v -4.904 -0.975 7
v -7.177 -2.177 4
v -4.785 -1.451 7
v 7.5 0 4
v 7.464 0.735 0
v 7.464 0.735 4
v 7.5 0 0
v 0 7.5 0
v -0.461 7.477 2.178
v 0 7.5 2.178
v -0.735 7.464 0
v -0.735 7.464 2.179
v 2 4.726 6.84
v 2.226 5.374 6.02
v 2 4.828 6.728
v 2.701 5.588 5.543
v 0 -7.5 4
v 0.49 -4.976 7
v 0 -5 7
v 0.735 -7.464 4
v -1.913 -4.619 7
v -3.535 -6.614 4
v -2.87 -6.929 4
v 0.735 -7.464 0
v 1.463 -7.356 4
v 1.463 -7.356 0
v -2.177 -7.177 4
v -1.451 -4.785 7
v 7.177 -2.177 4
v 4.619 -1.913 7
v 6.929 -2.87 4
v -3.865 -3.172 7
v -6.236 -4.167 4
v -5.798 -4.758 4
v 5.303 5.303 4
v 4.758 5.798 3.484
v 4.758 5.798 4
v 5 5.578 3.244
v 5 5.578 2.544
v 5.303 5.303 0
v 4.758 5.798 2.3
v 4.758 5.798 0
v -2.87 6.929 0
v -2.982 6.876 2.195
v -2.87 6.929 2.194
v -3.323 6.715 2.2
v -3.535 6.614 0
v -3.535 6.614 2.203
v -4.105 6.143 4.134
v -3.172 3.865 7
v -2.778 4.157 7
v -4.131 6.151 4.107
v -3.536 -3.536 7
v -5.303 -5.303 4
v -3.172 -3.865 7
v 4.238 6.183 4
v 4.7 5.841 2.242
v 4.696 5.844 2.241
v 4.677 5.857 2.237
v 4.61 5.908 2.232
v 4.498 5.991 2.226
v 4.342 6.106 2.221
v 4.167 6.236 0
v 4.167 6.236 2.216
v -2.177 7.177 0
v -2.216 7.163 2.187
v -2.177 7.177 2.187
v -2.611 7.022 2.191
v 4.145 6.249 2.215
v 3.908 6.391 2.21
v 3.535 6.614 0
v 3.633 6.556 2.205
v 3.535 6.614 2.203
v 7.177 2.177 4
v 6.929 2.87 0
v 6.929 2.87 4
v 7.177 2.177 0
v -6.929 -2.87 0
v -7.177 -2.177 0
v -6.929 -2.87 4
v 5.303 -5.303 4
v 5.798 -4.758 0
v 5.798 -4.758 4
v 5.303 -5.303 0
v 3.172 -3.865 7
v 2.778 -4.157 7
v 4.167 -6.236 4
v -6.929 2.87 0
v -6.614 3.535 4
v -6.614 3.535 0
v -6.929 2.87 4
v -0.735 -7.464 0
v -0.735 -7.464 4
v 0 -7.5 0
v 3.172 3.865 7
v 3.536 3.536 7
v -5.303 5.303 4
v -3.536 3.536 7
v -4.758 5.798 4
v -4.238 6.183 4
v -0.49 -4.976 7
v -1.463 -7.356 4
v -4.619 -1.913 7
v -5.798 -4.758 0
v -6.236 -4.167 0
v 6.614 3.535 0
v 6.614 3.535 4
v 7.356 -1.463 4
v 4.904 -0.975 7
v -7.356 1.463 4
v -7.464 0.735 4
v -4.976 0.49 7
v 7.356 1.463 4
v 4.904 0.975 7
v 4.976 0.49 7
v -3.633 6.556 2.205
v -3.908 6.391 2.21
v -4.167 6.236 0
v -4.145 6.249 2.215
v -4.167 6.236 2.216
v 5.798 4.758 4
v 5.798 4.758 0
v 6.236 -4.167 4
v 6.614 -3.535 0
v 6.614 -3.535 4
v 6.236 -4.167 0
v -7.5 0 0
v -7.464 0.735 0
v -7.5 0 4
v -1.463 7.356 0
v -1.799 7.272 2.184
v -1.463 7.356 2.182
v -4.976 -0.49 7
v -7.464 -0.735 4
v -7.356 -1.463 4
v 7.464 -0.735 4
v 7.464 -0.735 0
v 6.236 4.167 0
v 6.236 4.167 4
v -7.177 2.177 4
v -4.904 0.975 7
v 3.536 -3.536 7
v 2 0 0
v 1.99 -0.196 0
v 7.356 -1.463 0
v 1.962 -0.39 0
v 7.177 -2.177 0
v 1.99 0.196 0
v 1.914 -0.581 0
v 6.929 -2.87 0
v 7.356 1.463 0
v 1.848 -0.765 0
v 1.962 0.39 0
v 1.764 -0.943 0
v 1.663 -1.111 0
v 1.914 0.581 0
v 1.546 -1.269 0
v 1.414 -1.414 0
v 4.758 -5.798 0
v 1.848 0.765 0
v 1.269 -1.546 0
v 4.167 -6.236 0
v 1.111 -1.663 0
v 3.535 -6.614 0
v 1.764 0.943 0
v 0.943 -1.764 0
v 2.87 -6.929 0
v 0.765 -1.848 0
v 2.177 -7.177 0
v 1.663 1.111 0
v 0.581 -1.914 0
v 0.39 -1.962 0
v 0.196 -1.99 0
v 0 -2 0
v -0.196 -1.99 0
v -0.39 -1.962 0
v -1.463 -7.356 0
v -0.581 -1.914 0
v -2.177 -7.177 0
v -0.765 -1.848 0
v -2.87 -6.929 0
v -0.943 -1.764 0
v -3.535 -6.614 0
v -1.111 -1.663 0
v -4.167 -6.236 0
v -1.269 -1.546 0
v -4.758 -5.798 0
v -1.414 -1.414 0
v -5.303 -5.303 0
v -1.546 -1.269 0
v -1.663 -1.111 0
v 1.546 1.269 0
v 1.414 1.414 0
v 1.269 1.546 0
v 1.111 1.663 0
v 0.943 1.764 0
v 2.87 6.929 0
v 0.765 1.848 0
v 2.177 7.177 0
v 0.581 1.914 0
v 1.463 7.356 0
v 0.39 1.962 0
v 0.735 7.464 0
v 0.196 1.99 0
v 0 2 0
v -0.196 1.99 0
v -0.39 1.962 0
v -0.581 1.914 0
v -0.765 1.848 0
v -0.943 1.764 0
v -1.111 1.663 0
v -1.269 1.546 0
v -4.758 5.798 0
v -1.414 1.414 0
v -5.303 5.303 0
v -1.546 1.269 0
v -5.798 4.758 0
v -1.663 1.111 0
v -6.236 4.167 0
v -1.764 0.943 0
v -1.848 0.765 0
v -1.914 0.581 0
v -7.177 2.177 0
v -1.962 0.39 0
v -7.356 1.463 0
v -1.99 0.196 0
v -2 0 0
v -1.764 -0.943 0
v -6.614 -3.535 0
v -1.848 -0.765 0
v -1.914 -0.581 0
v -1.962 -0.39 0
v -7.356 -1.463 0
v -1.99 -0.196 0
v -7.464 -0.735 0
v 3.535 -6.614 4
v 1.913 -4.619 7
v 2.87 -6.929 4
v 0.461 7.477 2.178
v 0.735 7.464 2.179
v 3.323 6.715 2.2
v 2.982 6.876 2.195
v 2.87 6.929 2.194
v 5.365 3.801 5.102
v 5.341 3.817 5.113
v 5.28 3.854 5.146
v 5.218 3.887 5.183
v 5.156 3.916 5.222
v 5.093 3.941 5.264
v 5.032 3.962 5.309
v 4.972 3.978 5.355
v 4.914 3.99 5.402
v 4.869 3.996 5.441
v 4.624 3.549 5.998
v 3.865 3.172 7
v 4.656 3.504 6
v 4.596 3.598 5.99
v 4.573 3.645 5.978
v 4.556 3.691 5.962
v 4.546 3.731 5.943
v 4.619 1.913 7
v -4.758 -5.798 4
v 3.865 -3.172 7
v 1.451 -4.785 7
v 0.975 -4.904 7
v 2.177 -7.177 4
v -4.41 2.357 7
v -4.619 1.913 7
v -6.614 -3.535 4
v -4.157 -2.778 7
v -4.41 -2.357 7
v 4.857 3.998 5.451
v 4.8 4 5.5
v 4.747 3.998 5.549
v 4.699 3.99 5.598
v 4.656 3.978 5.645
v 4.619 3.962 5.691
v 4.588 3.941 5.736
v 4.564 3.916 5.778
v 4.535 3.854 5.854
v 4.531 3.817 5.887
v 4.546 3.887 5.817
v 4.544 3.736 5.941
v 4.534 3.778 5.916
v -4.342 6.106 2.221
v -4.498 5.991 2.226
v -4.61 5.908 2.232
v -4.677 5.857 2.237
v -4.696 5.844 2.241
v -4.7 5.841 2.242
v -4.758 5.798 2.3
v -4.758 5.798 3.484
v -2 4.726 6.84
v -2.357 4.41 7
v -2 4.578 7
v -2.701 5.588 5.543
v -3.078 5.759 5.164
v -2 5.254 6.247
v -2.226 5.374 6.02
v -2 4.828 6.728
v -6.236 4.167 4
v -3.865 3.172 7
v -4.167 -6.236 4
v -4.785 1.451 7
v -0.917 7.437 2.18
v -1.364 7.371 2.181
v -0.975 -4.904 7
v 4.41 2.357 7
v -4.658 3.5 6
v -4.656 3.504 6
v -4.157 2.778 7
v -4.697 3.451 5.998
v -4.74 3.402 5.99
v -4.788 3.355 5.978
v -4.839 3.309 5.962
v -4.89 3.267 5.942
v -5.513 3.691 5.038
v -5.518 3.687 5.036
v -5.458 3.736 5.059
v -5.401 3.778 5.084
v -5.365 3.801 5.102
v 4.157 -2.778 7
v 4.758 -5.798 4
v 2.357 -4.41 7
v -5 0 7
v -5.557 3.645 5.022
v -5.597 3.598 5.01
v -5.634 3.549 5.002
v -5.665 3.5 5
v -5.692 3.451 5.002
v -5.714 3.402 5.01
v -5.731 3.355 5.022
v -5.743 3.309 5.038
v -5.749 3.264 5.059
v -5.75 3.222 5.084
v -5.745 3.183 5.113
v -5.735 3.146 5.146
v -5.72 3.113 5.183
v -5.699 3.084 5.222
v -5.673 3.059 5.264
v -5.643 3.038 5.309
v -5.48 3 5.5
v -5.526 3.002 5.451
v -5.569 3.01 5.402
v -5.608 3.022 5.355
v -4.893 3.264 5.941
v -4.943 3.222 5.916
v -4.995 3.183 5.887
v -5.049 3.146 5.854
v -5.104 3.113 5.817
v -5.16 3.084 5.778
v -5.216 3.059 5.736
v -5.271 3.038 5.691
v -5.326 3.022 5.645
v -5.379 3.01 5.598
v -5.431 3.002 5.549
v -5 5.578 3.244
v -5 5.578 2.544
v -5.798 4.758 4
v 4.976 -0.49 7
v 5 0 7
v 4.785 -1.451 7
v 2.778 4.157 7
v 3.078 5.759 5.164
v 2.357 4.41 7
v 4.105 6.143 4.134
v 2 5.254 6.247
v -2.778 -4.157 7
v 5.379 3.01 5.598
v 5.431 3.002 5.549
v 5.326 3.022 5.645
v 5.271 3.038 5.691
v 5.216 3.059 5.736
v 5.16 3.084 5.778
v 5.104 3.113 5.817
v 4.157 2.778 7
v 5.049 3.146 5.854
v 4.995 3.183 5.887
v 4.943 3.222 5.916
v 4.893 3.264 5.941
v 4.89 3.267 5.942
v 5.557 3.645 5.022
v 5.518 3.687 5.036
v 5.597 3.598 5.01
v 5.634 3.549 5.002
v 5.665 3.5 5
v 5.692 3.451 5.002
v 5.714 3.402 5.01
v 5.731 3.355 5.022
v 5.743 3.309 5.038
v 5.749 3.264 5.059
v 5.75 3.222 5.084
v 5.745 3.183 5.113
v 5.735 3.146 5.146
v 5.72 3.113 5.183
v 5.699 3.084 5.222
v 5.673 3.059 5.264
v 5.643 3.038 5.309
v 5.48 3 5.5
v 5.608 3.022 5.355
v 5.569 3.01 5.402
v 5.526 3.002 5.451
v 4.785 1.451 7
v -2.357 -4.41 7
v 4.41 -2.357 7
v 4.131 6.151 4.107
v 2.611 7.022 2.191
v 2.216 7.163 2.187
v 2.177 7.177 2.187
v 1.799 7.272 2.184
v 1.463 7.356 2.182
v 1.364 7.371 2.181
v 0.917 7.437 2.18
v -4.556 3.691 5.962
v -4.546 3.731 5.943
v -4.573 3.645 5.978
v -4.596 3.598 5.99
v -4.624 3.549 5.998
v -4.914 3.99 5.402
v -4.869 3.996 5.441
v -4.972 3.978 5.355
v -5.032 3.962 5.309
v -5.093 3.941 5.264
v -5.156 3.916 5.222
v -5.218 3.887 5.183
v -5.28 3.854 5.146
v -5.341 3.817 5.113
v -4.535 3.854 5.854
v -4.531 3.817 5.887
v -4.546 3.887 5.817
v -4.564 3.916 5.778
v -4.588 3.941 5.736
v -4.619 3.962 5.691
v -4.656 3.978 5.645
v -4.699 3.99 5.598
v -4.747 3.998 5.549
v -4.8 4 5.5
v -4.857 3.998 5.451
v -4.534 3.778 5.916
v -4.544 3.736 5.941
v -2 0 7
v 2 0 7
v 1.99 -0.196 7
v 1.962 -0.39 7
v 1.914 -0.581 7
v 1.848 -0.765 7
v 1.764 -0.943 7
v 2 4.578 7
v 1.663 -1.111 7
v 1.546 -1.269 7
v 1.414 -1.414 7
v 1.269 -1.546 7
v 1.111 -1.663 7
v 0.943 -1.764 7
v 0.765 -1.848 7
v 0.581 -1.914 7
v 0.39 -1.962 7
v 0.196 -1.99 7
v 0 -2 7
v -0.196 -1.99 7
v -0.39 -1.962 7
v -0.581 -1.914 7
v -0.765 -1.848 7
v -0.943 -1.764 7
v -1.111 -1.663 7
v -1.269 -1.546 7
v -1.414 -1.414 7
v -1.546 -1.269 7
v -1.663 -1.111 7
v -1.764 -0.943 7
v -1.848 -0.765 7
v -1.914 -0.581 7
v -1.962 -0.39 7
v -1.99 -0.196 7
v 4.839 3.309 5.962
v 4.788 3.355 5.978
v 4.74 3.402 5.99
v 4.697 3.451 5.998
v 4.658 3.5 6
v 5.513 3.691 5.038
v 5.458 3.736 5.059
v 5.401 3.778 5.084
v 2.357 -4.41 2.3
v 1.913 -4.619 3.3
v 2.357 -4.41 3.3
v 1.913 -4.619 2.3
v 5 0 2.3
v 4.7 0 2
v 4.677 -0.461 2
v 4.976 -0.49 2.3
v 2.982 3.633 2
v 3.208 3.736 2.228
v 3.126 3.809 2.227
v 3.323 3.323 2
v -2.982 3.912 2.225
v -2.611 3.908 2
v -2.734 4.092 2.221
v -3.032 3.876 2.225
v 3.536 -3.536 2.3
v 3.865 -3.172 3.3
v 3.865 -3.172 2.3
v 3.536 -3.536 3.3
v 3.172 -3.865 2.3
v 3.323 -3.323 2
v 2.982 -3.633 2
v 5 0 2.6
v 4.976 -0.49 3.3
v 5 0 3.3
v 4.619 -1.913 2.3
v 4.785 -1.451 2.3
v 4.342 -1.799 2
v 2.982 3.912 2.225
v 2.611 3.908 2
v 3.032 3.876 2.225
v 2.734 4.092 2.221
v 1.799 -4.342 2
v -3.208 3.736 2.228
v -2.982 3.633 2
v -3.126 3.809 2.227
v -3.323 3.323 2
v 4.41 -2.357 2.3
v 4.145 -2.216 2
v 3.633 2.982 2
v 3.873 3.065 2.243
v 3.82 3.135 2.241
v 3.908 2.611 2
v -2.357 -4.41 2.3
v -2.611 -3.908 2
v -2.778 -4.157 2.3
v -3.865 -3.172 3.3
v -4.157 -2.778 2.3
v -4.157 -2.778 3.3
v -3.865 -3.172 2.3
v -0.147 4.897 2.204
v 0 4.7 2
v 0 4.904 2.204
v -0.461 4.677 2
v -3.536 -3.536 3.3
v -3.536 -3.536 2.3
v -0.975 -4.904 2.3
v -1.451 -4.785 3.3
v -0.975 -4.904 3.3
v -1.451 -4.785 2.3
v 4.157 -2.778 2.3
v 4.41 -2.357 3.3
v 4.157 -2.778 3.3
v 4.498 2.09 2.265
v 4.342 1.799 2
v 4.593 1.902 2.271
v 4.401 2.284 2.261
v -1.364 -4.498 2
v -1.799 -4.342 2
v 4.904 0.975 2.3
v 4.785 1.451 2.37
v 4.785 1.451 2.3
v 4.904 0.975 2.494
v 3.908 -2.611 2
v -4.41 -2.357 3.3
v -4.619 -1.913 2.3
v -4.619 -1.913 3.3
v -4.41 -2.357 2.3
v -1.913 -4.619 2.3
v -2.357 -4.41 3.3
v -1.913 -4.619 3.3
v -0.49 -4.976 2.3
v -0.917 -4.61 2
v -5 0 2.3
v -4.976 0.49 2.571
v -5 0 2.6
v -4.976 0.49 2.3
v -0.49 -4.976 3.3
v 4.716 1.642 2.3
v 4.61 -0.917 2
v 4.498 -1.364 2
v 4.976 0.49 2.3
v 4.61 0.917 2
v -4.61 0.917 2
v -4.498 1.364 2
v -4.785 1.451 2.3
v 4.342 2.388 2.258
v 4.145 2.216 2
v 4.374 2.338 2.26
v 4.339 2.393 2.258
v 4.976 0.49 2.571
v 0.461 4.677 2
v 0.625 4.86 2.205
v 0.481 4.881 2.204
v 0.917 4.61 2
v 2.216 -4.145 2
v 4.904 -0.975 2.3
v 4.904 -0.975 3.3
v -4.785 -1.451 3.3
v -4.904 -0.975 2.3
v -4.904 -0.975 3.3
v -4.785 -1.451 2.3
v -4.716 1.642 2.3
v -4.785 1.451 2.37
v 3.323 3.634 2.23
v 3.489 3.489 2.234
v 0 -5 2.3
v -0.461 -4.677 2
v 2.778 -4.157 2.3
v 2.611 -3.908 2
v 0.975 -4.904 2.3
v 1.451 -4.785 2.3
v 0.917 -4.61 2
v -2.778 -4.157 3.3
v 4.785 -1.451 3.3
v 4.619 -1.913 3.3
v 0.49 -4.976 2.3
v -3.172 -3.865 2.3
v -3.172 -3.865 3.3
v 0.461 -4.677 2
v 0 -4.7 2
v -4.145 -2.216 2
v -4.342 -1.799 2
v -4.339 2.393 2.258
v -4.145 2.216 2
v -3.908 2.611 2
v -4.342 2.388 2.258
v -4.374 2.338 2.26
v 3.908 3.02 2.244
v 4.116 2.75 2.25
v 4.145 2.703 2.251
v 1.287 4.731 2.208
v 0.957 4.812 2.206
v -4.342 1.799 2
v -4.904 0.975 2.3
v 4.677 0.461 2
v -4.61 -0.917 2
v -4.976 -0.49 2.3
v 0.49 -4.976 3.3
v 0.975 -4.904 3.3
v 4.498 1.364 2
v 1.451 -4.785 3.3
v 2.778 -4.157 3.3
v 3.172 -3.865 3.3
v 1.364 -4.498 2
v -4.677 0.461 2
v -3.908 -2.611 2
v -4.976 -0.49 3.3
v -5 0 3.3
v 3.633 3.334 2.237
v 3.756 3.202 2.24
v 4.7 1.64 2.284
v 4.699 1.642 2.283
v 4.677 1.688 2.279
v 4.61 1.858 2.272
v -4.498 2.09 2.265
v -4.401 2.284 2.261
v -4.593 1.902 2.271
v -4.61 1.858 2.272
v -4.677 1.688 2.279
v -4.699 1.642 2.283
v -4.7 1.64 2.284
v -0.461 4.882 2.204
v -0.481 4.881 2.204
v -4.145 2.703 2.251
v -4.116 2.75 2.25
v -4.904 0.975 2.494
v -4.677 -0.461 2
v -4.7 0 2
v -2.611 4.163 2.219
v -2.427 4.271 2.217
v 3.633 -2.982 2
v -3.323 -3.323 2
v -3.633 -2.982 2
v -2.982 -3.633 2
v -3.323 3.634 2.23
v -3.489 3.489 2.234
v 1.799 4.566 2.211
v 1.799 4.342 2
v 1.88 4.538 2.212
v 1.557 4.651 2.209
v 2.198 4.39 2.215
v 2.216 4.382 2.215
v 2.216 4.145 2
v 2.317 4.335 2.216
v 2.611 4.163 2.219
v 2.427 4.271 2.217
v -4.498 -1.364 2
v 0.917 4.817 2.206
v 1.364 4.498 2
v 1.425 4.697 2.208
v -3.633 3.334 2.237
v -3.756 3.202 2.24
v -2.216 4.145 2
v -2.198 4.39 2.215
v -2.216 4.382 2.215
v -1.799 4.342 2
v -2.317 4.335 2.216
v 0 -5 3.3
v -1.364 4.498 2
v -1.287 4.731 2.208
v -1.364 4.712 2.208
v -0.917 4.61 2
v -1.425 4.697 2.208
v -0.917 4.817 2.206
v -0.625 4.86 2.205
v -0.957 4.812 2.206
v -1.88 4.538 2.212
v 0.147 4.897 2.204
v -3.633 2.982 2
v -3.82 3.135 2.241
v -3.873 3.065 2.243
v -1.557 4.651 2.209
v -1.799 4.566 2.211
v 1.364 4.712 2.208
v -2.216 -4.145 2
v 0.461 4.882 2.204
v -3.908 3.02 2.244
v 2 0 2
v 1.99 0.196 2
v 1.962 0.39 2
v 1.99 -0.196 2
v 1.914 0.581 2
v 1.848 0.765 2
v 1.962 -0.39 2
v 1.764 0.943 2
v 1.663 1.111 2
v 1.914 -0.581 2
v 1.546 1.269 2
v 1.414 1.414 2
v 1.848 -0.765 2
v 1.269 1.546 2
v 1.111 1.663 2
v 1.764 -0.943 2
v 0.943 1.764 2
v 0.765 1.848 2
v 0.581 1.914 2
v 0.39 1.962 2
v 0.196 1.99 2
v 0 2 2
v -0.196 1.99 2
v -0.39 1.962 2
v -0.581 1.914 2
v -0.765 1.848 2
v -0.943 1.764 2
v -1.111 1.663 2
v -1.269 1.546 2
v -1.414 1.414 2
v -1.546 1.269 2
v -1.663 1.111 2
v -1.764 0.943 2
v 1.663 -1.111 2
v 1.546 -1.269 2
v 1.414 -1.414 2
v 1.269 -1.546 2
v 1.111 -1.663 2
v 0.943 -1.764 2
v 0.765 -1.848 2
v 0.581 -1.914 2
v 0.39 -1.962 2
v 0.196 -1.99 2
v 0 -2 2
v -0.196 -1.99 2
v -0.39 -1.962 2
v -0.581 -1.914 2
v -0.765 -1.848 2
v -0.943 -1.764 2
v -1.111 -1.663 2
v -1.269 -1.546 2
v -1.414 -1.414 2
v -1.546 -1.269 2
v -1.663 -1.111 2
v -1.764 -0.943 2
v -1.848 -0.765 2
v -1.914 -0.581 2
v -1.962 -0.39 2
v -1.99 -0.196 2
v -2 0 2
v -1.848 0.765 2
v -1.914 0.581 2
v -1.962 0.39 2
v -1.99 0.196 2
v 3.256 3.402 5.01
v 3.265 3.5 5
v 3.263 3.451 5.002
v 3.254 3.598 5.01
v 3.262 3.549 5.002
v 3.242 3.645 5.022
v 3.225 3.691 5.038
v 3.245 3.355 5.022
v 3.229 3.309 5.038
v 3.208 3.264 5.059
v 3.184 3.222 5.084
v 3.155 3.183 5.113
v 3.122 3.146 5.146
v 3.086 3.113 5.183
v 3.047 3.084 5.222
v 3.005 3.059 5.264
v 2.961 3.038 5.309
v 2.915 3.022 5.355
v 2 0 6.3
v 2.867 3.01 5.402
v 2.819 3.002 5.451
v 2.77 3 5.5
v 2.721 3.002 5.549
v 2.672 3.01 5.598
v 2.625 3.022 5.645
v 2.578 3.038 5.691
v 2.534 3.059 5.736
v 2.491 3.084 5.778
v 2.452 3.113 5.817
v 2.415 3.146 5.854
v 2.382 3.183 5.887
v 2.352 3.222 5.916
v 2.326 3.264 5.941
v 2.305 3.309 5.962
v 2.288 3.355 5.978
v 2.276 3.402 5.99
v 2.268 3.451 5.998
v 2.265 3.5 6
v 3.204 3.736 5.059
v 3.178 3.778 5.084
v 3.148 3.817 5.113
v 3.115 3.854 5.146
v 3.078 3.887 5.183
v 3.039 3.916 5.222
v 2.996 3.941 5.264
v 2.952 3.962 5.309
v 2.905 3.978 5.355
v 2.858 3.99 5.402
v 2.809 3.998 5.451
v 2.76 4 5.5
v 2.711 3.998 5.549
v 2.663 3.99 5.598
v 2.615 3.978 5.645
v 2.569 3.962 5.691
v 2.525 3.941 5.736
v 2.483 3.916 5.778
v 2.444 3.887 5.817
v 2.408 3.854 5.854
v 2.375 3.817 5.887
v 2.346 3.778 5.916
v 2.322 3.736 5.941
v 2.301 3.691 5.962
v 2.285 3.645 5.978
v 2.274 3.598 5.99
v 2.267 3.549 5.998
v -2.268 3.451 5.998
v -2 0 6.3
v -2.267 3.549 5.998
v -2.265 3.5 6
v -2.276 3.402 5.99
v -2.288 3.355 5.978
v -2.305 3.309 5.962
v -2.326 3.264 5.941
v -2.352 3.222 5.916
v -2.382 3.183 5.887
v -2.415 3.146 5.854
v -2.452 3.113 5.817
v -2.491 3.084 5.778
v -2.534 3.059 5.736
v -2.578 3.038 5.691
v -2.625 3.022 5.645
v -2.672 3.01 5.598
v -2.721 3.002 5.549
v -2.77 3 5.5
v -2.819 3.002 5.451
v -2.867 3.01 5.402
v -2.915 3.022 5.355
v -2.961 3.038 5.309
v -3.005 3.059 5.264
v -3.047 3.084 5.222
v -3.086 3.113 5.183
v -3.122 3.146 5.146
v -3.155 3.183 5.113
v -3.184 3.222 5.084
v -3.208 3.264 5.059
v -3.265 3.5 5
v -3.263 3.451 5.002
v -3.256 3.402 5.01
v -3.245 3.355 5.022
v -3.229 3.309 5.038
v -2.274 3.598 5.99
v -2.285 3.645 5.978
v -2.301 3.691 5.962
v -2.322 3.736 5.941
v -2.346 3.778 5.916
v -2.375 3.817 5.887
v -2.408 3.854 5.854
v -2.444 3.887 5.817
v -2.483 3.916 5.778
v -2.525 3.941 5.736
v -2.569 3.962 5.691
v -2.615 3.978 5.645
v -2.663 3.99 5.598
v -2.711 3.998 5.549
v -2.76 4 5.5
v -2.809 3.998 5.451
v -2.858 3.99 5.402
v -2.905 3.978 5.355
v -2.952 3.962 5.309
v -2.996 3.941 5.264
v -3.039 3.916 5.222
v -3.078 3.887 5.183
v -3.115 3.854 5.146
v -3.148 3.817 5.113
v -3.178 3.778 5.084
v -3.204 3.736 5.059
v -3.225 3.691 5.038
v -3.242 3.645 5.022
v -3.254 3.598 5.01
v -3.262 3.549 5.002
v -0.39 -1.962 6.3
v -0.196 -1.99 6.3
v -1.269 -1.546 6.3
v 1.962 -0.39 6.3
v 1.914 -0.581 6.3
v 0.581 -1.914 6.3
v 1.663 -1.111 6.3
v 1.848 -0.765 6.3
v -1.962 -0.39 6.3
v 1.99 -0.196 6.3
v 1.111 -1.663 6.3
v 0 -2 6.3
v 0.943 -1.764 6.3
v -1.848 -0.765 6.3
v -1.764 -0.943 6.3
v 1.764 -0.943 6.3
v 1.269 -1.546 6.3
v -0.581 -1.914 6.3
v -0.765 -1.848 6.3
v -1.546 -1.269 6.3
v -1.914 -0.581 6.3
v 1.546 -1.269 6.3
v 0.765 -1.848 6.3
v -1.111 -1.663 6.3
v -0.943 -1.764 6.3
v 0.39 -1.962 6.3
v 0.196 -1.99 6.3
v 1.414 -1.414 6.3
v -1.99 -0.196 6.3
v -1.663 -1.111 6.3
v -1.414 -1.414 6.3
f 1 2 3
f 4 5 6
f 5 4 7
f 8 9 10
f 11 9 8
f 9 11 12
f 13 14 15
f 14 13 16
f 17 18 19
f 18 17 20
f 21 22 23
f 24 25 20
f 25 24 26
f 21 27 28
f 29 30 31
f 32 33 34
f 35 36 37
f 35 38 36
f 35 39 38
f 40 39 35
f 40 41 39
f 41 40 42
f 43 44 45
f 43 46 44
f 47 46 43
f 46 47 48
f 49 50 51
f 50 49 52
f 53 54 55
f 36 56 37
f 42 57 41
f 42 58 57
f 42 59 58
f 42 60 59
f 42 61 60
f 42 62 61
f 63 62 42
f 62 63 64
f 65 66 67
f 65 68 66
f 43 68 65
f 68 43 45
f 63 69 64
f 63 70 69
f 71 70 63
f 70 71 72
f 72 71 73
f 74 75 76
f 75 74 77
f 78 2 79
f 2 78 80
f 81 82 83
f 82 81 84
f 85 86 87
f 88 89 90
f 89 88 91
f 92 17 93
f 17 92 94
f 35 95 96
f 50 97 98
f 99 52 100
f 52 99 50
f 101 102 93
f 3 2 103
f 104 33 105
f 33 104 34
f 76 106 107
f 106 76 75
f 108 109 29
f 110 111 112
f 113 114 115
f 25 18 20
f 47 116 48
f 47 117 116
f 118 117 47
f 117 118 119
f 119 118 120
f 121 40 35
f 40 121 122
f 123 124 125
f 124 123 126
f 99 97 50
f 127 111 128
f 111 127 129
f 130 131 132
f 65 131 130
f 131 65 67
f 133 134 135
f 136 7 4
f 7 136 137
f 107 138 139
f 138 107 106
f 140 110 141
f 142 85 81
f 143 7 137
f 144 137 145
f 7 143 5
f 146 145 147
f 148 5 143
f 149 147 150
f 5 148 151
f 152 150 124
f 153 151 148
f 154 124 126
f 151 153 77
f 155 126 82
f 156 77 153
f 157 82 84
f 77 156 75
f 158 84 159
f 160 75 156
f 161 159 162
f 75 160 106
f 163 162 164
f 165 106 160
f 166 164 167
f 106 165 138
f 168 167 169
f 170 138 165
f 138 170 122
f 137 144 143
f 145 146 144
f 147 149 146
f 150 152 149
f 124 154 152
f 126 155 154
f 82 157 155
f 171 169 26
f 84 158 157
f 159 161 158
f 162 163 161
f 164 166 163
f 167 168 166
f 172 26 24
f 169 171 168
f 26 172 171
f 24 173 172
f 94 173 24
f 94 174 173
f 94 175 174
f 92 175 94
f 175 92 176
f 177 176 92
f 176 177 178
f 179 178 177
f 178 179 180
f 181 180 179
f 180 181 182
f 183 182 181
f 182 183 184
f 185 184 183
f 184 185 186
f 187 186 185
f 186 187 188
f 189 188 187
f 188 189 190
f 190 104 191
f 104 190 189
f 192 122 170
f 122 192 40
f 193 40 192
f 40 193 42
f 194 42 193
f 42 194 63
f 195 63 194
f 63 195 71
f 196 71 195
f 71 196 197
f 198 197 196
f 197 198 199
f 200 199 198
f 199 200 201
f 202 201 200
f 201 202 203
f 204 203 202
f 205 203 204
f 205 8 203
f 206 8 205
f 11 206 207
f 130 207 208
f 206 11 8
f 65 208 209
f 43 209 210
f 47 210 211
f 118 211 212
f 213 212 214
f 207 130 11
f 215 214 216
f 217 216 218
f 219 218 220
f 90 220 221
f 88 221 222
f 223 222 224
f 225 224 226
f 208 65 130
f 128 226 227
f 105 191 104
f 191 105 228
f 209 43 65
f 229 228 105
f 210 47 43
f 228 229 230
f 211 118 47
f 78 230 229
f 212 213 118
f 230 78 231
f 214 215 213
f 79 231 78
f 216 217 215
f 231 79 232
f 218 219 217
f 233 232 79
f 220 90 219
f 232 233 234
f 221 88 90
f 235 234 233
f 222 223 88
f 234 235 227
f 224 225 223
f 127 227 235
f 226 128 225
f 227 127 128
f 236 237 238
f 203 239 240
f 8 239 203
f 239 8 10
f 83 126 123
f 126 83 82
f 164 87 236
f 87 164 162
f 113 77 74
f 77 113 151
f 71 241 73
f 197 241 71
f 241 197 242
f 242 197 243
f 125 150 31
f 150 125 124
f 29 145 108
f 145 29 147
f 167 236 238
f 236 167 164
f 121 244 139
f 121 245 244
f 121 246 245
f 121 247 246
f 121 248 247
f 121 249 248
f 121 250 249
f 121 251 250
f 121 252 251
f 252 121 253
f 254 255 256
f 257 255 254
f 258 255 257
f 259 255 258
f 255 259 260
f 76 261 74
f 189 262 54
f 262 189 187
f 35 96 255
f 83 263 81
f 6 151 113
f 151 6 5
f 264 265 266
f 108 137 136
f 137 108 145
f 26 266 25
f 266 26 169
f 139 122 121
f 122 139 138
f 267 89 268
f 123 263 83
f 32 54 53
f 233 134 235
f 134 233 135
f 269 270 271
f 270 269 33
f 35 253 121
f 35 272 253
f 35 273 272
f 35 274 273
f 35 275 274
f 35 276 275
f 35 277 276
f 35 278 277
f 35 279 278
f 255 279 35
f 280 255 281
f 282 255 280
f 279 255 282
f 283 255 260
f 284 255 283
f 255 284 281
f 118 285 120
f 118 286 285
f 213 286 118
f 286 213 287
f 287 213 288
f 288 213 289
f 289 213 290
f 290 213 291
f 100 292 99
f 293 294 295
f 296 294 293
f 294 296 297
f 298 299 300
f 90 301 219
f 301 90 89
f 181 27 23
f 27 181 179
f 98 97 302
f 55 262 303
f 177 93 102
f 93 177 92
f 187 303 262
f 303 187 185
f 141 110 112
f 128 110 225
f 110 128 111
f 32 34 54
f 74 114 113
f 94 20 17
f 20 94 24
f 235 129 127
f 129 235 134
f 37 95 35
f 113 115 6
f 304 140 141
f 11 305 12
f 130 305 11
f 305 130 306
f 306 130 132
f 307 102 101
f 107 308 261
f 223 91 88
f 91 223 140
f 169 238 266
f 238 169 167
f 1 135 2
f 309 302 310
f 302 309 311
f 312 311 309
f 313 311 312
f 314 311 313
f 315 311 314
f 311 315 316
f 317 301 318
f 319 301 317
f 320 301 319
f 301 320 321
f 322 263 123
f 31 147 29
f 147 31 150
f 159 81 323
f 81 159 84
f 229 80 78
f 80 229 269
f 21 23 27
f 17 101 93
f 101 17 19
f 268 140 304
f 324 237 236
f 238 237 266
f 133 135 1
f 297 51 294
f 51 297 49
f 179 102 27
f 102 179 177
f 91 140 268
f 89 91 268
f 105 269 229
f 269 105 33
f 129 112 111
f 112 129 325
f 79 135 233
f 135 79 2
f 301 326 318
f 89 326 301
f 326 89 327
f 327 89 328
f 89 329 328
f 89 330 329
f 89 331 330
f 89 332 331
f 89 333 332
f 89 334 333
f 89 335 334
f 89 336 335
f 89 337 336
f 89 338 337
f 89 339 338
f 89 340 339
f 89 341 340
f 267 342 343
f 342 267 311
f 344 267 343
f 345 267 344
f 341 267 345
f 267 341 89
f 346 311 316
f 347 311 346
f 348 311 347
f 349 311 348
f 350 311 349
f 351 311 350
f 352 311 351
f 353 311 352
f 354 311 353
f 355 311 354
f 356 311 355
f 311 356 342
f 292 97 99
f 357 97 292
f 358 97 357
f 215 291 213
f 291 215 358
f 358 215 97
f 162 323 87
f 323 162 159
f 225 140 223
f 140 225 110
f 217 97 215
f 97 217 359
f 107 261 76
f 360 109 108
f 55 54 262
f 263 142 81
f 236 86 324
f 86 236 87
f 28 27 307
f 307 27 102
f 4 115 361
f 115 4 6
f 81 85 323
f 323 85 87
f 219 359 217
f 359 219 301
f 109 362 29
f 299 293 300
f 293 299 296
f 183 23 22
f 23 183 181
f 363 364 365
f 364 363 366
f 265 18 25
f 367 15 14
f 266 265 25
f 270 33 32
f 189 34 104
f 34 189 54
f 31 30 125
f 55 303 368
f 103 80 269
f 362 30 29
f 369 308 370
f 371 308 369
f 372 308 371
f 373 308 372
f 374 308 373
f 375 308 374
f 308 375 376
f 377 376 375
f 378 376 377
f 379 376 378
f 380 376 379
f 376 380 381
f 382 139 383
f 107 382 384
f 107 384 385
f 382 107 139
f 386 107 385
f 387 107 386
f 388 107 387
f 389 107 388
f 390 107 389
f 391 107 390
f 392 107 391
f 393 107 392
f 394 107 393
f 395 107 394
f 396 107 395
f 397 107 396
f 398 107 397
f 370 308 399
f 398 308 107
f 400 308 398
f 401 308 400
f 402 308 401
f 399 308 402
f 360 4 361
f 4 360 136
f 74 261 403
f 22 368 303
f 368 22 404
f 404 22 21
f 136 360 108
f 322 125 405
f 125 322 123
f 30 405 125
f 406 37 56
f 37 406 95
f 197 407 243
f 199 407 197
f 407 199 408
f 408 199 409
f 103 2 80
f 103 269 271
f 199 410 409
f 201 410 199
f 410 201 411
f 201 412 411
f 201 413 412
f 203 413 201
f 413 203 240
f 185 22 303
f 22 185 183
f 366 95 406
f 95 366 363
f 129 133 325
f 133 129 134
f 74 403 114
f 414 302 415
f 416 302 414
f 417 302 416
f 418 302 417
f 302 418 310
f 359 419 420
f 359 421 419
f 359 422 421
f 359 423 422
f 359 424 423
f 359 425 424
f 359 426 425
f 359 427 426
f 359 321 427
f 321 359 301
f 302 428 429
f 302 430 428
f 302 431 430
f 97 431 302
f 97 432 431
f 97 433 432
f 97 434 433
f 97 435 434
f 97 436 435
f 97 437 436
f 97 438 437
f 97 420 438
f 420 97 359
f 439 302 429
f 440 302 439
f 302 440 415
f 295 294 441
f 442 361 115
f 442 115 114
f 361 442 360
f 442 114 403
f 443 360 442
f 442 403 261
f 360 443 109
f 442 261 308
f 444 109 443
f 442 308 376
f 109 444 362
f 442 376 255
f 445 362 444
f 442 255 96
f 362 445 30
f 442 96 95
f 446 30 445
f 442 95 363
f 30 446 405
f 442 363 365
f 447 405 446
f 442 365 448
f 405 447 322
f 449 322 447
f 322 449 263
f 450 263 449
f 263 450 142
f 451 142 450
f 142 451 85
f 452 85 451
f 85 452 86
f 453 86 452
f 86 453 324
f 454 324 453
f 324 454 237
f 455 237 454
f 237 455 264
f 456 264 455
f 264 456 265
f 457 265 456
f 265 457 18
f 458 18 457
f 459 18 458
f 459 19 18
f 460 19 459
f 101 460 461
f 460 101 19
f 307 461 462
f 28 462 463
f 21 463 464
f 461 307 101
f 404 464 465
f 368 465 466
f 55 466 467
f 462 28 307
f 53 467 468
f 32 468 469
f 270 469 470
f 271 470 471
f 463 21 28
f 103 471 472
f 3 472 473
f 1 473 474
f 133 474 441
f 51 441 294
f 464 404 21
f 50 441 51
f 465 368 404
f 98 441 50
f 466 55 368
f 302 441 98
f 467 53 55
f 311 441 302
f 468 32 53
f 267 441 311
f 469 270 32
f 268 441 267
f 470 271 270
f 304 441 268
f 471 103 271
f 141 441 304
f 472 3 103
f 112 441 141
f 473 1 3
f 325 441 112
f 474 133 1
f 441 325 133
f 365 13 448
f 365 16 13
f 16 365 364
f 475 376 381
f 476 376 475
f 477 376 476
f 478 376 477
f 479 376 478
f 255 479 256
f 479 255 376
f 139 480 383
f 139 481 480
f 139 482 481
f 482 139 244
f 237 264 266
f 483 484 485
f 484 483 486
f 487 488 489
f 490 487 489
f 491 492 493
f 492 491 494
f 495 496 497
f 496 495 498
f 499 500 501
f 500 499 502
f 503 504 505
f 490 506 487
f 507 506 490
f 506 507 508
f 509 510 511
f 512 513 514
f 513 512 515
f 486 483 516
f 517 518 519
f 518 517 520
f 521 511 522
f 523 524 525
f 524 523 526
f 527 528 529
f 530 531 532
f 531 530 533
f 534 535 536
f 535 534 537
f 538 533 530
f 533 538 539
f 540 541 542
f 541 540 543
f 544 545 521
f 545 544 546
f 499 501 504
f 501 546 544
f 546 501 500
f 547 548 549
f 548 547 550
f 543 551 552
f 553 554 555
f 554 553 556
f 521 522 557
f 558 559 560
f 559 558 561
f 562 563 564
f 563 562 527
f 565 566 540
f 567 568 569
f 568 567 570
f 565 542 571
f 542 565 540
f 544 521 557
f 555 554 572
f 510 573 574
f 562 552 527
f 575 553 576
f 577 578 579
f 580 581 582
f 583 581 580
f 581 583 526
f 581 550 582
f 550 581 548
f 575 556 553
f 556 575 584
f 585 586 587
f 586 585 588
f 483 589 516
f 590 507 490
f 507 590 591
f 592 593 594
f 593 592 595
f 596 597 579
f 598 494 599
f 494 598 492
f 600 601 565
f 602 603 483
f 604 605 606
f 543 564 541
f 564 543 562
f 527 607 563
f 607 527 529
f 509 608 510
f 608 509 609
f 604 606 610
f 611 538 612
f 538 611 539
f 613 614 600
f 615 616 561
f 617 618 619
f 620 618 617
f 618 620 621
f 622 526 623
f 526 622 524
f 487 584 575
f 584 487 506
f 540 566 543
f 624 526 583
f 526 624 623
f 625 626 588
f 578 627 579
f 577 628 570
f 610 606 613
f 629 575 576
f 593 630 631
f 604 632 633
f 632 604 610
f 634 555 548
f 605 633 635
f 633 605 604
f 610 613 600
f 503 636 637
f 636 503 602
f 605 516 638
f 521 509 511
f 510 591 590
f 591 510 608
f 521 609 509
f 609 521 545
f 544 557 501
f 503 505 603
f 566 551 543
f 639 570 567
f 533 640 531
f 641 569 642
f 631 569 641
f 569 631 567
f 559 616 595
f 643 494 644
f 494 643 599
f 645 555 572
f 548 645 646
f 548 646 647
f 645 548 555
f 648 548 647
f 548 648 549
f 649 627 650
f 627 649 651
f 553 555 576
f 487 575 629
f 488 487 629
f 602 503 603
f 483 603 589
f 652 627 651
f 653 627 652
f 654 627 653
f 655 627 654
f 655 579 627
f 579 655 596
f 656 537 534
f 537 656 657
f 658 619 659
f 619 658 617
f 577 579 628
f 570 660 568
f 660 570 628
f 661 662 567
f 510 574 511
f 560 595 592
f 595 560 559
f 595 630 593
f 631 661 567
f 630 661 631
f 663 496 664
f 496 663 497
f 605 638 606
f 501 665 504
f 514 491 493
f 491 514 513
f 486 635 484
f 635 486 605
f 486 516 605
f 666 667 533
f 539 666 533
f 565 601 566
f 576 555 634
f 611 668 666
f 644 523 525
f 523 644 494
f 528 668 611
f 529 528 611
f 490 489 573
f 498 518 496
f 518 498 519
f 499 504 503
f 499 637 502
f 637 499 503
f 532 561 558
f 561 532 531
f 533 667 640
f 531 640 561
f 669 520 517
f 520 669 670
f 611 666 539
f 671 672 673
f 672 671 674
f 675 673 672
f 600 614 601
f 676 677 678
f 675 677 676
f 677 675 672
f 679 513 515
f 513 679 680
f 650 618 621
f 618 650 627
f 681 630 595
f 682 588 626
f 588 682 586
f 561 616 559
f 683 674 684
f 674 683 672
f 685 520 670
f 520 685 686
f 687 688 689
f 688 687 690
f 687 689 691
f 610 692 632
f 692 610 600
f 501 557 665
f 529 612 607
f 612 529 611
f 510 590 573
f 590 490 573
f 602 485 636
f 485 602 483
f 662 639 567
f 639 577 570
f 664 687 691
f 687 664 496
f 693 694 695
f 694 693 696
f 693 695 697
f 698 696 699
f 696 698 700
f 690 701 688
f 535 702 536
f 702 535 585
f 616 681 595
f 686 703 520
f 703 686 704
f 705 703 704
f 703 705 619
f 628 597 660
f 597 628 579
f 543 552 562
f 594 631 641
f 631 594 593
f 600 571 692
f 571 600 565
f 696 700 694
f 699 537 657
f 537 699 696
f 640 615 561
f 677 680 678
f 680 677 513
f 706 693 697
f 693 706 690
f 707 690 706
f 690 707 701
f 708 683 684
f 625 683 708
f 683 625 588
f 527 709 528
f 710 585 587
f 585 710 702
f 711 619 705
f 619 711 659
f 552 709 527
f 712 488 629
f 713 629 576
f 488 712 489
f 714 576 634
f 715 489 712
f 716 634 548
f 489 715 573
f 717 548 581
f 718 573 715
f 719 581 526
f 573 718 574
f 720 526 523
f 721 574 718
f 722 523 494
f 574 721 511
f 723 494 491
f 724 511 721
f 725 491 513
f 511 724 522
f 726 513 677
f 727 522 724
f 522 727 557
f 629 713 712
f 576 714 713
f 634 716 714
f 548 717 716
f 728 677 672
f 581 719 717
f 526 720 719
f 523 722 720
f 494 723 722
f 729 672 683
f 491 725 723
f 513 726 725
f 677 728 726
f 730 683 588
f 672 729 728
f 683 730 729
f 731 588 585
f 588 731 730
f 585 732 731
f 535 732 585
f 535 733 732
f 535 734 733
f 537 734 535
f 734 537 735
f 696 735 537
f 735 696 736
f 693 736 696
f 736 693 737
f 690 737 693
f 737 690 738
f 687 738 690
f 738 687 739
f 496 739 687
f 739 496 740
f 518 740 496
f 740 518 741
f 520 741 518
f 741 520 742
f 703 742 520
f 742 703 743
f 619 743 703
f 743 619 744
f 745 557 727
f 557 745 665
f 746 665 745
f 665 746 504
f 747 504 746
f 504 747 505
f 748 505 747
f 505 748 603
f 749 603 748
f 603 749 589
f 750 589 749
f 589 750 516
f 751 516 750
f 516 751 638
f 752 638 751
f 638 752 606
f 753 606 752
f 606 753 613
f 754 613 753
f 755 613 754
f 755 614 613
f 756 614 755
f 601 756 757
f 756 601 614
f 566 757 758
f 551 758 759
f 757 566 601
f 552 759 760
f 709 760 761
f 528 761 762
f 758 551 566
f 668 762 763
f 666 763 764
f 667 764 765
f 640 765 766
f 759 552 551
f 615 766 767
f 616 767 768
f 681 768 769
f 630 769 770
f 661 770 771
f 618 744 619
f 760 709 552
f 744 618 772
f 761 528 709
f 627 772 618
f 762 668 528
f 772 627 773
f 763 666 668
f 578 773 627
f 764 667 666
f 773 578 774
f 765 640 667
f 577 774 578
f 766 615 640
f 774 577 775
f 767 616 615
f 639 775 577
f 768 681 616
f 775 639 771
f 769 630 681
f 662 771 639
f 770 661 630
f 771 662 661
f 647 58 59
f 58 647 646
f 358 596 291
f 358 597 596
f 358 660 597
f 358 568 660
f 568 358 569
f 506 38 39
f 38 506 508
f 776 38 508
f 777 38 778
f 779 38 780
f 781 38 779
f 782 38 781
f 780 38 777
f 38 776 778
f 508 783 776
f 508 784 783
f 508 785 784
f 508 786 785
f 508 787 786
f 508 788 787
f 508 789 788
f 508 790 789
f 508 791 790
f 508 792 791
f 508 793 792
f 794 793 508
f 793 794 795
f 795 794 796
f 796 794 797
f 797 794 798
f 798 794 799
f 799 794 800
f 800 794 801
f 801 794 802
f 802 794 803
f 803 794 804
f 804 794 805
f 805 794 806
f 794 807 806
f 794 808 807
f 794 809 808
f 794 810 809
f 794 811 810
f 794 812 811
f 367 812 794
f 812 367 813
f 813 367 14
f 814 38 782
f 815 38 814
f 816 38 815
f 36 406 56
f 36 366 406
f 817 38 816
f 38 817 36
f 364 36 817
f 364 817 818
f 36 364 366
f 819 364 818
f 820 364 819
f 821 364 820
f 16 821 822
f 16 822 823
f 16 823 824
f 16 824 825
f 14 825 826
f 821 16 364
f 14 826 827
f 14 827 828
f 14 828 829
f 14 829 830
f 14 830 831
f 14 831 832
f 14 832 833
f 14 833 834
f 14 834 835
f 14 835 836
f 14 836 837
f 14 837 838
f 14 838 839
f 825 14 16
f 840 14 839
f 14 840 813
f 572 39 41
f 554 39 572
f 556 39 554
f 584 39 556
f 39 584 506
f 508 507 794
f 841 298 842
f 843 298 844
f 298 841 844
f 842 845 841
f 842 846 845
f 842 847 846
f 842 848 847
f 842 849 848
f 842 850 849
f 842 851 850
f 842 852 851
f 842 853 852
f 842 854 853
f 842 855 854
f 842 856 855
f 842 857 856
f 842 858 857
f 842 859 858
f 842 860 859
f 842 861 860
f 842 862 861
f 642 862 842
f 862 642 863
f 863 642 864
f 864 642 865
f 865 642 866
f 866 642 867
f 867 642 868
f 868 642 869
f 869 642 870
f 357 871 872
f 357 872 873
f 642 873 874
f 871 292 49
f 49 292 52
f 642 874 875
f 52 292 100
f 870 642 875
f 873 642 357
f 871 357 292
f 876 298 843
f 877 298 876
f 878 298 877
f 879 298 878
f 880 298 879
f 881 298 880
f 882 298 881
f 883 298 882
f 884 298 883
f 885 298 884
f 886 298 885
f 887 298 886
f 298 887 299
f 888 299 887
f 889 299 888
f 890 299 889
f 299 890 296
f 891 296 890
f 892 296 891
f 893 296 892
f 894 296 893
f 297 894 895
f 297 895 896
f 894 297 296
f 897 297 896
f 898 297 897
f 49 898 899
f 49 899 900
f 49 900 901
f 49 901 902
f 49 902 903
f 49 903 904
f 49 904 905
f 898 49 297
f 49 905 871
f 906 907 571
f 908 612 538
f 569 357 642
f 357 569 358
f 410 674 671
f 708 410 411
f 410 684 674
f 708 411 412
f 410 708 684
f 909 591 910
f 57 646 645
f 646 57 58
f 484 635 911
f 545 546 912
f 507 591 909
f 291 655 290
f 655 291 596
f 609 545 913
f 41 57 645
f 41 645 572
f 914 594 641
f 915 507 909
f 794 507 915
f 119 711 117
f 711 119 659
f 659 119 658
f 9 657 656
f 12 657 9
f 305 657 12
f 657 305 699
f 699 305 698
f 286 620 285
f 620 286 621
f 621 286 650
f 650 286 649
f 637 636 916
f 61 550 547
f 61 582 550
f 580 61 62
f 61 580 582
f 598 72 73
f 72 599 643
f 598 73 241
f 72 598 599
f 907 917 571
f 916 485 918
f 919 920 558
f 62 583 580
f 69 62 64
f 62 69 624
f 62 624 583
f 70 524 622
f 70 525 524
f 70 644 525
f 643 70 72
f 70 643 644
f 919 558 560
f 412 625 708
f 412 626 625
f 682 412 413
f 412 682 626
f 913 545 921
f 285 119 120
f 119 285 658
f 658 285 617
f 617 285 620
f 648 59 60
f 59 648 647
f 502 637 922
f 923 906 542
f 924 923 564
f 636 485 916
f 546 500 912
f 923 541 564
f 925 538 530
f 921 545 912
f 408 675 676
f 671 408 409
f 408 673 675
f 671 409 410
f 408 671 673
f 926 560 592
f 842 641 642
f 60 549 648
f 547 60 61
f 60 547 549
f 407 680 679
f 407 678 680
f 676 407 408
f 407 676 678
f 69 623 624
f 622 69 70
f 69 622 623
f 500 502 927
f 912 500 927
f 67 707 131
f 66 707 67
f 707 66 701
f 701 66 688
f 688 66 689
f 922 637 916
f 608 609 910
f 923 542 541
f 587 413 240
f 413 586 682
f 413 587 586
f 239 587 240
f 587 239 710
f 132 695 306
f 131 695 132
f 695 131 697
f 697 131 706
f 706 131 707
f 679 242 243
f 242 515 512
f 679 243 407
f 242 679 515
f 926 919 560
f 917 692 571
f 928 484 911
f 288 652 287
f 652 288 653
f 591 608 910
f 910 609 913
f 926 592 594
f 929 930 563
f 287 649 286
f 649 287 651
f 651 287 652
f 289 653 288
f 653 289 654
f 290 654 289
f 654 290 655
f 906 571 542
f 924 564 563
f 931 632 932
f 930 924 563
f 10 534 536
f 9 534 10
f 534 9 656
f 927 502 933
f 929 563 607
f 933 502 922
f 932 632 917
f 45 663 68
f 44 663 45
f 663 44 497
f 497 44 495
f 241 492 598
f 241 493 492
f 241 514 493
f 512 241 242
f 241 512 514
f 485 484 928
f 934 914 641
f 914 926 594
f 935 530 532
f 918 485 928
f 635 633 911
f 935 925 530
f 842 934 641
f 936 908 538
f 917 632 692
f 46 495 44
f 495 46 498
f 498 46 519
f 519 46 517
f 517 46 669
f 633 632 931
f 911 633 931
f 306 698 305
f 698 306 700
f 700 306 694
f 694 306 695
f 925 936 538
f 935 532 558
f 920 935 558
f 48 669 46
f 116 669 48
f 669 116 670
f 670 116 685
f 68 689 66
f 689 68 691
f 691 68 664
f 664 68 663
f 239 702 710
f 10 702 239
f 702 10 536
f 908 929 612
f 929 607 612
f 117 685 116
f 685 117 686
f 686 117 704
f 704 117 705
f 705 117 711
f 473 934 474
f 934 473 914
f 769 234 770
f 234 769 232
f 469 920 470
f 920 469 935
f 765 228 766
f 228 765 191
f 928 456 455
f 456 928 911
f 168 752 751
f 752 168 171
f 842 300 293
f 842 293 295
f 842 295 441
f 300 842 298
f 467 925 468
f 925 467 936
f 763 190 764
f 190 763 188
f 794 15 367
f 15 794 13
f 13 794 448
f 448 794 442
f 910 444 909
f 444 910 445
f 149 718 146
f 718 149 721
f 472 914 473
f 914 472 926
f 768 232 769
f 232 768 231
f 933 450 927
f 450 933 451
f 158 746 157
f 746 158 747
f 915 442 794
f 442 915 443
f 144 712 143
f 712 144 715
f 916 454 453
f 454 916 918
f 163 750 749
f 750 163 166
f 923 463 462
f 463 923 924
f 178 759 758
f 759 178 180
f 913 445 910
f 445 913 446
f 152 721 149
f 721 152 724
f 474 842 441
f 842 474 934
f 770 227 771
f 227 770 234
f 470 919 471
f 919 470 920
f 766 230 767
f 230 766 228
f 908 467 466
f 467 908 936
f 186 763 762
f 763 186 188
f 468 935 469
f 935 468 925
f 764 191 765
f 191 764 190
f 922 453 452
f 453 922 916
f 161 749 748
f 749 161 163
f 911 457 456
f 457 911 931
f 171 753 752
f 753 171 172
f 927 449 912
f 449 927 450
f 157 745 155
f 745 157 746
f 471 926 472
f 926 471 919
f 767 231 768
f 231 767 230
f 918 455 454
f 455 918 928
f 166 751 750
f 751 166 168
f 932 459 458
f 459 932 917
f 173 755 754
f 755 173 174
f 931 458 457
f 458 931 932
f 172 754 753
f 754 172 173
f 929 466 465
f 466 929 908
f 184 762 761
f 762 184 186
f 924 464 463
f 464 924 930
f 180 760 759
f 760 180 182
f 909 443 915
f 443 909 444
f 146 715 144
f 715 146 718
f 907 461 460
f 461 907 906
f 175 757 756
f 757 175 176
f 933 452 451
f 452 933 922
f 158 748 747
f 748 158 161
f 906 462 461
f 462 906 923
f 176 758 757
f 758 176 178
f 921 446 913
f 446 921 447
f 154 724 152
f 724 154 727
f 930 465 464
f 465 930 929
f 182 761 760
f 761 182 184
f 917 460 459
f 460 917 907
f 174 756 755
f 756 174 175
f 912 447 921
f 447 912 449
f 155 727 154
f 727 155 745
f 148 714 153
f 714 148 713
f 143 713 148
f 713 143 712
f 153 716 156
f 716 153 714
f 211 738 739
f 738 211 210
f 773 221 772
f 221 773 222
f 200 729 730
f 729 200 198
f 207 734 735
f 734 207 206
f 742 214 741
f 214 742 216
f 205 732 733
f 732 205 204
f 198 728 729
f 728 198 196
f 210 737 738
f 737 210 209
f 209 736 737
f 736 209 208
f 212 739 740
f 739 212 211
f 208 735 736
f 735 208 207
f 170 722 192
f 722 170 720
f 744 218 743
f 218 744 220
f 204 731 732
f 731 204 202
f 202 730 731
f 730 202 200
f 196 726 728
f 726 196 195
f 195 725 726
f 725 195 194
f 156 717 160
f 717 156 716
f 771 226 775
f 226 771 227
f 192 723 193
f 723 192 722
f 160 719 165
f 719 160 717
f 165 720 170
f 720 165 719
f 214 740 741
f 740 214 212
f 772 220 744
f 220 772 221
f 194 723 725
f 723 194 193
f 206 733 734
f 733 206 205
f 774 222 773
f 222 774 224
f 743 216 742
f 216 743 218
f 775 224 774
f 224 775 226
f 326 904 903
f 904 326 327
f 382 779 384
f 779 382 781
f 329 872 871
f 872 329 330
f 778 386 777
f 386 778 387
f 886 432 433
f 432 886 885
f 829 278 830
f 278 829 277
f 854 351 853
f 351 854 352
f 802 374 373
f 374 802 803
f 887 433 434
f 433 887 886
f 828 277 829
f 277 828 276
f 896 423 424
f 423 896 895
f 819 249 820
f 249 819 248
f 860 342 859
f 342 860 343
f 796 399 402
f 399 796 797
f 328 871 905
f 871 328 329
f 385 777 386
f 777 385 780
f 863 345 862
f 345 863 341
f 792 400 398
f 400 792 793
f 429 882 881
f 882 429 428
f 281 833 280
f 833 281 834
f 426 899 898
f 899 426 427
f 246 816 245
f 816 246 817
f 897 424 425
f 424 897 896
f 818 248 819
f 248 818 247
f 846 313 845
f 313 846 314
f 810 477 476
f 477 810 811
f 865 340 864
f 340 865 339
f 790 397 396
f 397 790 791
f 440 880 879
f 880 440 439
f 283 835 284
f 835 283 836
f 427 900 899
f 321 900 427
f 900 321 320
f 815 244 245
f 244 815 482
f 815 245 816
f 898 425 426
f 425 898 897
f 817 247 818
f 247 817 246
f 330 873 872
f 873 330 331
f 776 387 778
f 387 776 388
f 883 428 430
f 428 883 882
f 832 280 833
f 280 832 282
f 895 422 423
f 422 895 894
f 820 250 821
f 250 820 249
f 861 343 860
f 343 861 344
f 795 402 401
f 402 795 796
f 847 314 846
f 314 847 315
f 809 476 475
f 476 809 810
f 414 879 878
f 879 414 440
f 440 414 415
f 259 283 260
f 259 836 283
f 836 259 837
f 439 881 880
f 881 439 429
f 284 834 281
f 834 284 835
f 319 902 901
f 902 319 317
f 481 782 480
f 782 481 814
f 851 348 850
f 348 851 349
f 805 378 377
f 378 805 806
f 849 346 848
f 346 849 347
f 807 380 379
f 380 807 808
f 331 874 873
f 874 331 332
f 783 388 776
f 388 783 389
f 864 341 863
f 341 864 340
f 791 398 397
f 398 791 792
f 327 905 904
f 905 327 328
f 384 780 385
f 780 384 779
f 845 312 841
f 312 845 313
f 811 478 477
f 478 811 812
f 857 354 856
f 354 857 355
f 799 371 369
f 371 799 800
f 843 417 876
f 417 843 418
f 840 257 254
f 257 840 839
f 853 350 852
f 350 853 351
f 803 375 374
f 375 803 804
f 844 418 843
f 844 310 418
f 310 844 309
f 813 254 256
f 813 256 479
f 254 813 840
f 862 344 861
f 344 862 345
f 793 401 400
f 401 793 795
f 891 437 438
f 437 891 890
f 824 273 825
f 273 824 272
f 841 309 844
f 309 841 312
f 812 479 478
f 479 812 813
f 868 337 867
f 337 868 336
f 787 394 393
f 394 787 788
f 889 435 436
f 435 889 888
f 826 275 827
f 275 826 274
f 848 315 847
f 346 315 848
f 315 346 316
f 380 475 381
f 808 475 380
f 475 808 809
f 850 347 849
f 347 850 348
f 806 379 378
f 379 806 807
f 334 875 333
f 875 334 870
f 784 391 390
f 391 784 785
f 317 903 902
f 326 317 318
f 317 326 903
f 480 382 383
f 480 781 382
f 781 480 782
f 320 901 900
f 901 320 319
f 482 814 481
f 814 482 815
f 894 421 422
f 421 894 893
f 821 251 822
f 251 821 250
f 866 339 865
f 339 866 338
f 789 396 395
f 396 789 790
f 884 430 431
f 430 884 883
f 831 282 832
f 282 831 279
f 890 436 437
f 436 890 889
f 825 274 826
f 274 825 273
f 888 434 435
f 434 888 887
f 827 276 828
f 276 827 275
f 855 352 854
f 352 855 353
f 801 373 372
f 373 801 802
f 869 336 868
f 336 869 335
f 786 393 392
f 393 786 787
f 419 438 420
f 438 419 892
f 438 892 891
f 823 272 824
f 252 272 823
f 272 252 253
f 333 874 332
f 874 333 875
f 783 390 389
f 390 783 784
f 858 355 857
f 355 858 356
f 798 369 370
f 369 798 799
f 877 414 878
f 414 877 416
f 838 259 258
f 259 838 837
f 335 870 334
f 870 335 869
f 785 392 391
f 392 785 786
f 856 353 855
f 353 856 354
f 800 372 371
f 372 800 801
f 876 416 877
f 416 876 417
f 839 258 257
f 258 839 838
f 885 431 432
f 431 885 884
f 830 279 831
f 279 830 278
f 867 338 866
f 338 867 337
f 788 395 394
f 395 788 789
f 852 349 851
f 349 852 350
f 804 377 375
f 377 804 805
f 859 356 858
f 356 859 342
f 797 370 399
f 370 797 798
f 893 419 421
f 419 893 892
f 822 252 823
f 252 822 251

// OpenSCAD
$fn=64;
difference()
{
    hull(){
        cylinder(d=15, h=4);
        cylinder(d=10, h=7);
    }
    translate([ 0,0,2])
        screw();
    
    hull() {
        translate([ 0, 0,2.3])
            screw();
        translate([ 0,30,2])
            screw();
    }
    hull() {
        translate([ 0,30,2])
            cylinder(d=4,h=20);
        translate([ 0, 0,2.3])
            cylinder(d=4,h=20);
    }
    cylinder(d=4,h=20, center=true);
    
    translate([0,3.5,5.5])
    rotate([0,90,0])
        cylinder(d=1, h=20, center=true);
}
module screw()
{    
    hull() {
        
        cylinder(d=9.4, h=0.7);
        translate([0,0,0.3])
            cylinder(d=10, h=0.7);
        cylinder(d= 4, h=4);
    }
}
